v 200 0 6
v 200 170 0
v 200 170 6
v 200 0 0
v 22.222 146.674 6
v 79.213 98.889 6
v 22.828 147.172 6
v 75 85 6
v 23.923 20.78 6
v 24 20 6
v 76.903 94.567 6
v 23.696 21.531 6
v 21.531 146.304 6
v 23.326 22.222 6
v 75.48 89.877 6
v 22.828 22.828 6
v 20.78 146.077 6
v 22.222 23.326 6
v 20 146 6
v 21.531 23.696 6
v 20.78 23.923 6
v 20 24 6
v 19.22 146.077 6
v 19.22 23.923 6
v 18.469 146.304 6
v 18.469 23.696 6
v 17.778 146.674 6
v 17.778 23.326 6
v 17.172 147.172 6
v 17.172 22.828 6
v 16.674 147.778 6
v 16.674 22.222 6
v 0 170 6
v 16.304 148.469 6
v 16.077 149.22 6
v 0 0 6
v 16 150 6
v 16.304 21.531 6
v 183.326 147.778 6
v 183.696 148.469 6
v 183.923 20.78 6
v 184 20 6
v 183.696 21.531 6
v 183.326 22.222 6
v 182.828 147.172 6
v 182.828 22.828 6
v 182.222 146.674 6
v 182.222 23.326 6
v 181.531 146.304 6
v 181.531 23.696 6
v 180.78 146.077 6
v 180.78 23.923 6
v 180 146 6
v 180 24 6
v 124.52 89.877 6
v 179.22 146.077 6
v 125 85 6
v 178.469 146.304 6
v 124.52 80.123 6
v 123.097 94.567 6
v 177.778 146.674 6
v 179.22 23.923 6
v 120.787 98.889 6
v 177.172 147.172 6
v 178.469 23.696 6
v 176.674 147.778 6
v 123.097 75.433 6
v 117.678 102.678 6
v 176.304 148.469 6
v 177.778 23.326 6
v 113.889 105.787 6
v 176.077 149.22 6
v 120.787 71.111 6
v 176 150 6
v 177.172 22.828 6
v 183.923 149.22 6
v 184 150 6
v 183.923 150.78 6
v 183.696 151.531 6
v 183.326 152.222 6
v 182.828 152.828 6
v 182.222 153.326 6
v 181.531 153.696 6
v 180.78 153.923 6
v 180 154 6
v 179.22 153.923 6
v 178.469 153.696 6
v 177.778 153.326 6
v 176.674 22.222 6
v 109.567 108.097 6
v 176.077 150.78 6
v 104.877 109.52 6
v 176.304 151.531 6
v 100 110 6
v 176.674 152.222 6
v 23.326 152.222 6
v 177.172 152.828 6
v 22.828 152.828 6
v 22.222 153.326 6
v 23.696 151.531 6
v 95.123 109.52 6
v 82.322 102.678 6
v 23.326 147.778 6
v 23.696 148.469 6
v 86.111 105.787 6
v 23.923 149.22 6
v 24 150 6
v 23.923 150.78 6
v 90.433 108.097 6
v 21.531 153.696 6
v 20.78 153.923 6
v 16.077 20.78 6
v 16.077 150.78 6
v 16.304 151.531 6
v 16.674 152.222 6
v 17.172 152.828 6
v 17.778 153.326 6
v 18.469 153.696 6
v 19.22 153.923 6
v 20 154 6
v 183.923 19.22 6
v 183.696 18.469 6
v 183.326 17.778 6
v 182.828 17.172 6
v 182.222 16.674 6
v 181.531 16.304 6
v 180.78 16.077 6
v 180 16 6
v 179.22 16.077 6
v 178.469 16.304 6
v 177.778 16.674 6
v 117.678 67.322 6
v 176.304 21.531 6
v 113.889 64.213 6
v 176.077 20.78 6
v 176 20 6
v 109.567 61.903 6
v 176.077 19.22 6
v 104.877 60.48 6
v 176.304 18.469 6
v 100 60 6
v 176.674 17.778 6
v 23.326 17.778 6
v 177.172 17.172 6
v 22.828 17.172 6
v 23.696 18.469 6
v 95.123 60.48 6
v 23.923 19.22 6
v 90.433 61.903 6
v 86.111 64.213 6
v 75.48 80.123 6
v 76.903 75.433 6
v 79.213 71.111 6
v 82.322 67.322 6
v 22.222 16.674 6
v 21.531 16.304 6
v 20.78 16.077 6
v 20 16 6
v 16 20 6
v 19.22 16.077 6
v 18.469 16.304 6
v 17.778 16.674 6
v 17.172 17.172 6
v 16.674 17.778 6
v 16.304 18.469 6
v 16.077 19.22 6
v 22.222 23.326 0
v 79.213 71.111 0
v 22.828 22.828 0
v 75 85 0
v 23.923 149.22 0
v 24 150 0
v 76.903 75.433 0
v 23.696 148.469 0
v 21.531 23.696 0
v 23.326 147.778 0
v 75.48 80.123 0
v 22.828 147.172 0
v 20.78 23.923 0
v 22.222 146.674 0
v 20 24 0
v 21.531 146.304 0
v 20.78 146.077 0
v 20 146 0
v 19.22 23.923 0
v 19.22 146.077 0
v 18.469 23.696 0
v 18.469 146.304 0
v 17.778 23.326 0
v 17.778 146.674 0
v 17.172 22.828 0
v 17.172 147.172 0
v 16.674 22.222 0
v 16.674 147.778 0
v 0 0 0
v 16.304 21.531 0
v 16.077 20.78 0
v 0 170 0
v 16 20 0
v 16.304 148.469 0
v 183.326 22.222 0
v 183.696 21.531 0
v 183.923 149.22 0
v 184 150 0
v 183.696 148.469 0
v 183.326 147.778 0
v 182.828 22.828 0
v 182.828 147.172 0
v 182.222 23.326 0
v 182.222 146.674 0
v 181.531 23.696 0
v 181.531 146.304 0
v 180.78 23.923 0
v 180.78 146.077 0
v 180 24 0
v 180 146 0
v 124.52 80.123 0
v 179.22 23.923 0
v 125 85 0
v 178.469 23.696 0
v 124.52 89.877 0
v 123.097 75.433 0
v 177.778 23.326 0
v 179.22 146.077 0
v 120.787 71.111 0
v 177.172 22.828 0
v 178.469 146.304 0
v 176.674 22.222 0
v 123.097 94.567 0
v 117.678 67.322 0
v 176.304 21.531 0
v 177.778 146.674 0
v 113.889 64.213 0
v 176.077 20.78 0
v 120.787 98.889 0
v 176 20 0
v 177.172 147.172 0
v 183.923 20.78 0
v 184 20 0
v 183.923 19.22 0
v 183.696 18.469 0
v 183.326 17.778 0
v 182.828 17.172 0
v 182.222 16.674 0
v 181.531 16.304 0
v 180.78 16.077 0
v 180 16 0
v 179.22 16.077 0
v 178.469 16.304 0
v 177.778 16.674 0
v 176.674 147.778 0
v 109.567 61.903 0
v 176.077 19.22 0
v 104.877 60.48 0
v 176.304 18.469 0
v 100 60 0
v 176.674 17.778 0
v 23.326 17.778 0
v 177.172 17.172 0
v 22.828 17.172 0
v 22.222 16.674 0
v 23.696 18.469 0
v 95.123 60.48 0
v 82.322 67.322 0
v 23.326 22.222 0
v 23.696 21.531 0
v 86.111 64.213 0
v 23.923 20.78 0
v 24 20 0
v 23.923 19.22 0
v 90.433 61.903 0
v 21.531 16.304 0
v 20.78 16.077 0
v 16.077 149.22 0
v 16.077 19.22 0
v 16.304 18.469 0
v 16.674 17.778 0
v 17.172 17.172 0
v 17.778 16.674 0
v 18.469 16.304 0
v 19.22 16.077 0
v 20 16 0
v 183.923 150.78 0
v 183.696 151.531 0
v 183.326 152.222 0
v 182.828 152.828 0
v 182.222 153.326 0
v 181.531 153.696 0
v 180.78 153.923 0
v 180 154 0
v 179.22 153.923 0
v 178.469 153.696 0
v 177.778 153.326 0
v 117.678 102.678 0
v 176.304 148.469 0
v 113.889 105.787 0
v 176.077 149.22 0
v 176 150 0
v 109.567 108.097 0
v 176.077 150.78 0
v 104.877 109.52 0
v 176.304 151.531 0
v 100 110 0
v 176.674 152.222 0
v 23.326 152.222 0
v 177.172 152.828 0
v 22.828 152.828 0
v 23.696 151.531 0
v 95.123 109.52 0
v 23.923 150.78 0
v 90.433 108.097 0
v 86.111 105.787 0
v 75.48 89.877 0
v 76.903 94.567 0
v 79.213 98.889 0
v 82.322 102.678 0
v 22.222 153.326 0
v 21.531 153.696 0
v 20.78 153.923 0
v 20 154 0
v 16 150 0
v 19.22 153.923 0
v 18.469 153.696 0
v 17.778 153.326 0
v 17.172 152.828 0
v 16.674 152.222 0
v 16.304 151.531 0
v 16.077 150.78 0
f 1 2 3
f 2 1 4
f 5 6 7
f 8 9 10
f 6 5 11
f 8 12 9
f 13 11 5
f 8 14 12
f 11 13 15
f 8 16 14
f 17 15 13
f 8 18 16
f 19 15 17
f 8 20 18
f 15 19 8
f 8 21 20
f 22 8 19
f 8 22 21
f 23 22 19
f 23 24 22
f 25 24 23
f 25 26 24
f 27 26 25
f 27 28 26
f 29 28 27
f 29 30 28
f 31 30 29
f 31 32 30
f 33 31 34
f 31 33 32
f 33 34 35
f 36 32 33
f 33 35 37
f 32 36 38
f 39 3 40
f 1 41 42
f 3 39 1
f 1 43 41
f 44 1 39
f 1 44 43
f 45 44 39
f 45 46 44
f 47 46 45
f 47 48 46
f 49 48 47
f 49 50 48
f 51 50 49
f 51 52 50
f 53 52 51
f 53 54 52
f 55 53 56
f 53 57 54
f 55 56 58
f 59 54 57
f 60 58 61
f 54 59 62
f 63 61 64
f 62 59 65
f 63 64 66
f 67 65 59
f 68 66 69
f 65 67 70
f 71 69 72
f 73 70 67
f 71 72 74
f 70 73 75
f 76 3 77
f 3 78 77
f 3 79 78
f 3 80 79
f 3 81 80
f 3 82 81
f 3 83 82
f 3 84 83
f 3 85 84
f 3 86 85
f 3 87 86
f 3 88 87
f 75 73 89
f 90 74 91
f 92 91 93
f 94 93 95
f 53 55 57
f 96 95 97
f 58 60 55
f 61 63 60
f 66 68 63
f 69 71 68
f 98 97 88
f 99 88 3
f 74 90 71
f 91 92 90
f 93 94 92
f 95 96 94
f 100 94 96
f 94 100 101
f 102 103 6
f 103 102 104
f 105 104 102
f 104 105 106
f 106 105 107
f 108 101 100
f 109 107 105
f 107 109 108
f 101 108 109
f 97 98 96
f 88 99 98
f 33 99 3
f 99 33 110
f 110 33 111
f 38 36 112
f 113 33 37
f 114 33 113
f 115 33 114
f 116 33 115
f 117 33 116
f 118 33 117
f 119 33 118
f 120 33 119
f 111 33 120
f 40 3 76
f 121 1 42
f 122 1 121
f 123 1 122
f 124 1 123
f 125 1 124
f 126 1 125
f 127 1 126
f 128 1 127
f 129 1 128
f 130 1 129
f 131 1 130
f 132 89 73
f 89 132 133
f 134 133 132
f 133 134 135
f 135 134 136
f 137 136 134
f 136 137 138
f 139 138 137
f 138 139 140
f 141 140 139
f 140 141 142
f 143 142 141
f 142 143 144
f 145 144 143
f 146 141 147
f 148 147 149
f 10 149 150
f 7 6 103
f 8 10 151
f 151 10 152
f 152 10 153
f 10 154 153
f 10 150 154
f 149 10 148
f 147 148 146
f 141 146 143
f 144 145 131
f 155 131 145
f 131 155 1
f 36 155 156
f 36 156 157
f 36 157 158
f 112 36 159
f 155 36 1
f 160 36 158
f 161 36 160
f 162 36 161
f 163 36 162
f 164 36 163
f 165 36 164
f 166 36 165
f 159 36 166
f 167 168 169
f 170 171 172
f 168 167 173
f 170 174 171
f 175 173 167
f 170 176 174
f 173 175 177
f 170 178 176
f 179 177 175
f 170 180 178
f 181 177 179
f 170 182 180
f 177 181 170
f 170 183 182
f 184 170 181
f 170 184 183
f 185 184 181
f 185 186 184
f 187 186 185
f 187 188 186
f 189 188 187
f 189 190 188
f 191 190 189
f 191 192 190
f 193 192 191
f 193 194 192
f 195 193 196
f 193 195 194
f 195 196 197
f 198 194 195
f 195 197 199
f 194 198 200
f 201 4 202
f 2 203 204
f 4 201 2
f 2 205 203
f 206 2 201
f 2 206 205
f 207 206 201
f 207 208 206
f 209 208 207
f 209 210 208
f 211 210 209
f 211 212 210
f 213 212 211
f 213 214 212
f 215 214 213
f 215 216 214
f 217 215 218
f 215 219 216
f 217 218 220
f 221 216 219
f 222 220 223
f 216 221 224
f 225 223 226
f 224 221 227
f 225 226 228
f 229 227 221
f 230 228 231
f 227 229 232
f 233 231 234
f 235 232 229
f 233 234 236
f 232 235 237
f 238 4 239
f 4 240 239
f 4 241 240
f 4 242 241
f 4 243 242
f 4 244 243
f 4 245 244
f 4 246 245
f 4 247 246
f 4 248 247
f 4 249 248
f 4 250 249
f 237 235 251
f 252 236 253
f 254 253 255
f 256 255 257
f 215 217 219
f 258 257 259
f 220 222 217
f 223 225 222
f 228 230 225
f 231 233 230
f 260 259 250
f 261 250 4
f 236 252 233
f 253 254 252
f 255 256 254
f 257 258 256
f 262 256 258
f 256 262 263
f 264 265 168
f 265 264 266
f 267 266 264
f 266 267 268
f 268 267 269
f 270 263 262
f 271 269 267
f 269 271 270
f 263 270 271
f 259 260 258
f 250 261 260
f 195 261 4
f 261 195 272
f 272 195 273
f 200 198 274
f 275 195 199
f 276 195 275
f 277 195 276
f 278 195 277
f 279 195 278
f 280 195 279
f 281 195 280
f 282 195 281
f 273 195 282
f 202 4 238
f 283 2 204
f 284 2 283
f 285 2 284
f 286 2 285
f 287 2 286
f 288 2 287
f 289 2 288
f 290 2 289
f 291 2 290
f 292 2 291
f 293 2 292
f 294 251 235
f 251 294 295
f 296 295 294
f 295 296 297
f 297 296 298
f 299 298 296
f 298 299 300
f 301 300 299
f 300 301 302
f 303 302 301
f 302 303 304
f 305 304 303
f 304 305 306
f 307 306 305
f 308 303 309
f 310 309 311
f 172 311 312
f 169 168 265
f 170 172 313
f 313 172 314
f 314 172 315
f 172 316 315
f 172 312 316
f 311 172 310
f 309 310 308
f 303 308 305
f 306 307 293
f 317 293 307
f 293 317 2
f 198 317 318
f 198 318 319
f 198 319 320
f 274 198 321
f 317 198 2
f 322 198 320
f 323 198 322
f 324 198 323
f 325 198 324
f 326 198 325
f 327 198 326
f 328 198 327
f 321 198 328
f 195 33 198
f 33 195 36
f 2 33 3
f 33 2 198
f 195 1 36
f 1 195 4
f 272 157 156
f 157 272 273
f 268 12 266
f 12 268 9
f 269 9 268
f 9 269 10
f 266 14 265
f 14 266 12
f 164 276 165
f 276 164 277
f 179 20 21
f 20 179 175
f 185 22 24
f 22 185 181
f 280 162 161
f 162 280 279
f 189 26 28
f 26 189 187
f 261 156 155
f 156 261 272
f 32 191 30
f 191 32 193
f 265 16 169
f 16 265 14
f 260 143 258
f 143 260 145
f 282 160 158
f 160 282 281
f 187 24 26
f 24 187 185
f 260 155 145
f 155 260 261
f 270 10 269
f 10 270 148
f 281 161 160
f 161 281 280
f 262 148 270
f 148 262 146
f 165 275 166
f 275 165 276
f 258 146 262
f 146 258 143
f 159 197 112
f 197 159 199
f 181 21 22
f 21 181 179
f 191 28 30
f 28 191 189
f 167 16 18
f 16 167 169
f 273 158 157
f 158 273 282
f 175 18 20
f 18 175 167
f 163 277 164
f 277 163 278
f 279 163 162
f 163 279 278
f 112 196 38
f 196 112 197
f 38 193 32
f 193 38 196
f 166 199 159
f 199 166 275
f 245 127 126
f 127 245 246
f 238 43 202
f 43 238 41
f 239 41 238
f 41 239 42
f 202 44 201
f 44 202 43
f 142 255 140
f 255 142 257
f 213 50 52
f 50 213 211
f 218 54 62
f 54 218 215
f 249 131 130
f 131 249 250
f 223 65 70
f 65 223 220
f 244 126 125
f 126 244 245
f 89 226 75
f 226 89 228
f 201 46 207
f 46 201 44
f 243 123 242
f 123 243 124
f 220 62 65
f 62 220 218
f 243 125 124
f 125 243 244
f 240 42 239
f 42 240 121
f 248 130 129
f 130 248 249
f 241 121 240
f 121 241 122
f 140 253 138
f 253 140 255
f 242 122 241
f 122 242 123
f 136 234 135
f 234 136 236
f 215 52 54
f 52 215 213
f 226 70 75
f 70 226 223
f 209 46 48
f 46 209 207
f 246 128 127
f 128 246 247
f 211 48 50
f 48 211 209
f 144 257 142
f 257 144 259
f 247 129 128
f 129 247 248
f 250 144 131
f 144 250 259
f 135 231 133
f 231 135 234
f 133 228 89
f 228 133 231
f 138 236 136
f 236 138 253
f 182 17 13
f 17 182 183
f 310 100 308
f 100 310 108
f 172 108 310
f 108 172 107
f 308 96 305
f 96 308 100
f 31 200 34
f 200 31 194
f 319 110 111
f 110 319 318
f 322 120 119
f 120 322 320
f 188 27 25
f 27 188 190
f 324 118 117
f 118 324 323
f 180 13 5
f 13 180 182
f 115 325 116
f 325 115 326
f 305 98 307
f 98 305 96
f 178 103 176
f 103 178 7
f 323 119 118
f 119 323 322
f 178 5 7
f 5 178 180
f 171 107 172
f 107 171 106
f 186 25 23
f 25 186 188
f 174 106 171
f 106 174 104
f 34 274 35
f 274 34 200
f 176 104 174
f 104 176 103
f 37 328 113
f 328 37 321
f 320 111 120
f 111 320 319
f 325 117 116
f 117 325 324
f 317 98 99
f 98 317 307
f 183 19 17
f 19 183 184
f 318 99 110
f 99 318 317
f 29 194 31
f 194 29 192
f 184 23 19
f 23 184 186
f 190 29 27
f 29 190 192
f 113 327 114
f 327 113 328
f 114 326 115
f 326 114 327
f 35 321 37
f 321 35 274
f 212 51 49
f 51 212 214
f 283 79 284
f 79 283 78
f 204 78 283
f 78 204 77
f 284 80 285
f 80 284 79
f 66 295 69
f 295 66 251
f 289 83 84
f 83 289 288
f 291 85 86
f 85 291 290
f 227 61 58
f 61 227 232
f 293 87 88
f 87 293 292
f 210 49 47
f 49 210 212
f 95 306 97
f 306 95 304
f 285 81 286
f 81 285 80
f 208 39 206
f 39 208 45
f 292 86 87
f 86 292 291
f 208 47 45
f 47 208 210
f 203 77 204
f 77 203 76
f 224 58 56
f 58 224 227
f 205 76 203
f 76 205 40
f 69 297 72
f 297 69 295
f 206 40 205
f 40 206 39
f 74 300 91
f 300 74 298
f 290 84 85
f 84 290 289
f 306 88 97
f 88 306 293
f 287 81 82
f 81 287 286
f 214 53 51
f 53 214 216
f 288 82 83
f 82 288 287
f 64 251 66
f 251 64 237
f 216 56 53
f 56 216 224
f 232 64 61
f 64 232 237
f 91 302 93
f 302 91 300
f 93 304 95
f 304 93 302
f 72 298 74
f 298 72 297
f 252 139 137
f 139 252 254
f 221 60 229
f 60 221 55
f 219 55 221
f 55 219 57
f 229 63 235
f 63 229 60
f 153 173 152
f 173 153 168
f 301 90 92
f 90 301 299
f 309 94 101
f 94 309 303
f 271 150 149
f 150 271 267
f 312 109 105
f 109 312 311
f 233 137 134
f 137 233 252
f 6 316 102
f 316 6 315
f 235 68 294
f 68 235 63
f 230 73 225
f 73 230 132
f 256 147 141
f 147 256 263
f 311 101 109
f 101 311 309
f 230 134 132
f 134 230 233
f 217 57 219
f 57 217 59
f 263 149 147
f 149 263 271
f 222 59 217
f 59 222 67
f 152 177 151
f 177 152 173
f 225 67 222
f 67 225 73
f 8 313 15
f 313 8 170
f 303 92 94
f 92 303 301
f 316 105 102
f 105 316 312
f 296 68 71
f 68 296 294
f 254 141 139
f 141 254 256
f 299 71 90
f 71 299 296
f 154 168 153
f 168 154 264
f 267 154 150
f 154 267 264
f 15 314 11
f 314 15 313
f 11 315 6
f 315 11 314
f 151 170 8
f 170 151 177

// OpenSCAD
$fn = 32;

// ----------------------------------------------------------------------
// Big plate: 200-250 mm adapter plate
// ----------------------------------------------------------------------

// --- parameters (mm) ---
plate_l = 200;            // plate length, X
plate_w = 170;            // plate width, Y
plate_t = 6;              // plate thickness, Z
corner_d = 8;             // corner hole diameter
corner_in = 20;           // corner hole inset from the edges
bore_d = 50;              // central bore

difference() {
  cube([plate_l, plate_w, plate_t]);
  translate([corner_in, corner_in, -1]) cylinder(h = plate_t + 2, d = corner_d);
  translate([plate_l - corner_in, corner_in, -1]) cylinder(h = plate_t + 2, d = corner_d);
  translate([corner_in, plate_w - corner_in, -1]) cylinder(h = plate_t + 2, d = corner_d);
  translate([plate_l - corner_in, plate_w - corner_in, -1]) cylinder(h = plate_t + 2, d = corner_d);
  translate([plate_l / 2, plate_w / 2, -1]) cylinder(h = plate_t + 2, d = bore_d);
}
